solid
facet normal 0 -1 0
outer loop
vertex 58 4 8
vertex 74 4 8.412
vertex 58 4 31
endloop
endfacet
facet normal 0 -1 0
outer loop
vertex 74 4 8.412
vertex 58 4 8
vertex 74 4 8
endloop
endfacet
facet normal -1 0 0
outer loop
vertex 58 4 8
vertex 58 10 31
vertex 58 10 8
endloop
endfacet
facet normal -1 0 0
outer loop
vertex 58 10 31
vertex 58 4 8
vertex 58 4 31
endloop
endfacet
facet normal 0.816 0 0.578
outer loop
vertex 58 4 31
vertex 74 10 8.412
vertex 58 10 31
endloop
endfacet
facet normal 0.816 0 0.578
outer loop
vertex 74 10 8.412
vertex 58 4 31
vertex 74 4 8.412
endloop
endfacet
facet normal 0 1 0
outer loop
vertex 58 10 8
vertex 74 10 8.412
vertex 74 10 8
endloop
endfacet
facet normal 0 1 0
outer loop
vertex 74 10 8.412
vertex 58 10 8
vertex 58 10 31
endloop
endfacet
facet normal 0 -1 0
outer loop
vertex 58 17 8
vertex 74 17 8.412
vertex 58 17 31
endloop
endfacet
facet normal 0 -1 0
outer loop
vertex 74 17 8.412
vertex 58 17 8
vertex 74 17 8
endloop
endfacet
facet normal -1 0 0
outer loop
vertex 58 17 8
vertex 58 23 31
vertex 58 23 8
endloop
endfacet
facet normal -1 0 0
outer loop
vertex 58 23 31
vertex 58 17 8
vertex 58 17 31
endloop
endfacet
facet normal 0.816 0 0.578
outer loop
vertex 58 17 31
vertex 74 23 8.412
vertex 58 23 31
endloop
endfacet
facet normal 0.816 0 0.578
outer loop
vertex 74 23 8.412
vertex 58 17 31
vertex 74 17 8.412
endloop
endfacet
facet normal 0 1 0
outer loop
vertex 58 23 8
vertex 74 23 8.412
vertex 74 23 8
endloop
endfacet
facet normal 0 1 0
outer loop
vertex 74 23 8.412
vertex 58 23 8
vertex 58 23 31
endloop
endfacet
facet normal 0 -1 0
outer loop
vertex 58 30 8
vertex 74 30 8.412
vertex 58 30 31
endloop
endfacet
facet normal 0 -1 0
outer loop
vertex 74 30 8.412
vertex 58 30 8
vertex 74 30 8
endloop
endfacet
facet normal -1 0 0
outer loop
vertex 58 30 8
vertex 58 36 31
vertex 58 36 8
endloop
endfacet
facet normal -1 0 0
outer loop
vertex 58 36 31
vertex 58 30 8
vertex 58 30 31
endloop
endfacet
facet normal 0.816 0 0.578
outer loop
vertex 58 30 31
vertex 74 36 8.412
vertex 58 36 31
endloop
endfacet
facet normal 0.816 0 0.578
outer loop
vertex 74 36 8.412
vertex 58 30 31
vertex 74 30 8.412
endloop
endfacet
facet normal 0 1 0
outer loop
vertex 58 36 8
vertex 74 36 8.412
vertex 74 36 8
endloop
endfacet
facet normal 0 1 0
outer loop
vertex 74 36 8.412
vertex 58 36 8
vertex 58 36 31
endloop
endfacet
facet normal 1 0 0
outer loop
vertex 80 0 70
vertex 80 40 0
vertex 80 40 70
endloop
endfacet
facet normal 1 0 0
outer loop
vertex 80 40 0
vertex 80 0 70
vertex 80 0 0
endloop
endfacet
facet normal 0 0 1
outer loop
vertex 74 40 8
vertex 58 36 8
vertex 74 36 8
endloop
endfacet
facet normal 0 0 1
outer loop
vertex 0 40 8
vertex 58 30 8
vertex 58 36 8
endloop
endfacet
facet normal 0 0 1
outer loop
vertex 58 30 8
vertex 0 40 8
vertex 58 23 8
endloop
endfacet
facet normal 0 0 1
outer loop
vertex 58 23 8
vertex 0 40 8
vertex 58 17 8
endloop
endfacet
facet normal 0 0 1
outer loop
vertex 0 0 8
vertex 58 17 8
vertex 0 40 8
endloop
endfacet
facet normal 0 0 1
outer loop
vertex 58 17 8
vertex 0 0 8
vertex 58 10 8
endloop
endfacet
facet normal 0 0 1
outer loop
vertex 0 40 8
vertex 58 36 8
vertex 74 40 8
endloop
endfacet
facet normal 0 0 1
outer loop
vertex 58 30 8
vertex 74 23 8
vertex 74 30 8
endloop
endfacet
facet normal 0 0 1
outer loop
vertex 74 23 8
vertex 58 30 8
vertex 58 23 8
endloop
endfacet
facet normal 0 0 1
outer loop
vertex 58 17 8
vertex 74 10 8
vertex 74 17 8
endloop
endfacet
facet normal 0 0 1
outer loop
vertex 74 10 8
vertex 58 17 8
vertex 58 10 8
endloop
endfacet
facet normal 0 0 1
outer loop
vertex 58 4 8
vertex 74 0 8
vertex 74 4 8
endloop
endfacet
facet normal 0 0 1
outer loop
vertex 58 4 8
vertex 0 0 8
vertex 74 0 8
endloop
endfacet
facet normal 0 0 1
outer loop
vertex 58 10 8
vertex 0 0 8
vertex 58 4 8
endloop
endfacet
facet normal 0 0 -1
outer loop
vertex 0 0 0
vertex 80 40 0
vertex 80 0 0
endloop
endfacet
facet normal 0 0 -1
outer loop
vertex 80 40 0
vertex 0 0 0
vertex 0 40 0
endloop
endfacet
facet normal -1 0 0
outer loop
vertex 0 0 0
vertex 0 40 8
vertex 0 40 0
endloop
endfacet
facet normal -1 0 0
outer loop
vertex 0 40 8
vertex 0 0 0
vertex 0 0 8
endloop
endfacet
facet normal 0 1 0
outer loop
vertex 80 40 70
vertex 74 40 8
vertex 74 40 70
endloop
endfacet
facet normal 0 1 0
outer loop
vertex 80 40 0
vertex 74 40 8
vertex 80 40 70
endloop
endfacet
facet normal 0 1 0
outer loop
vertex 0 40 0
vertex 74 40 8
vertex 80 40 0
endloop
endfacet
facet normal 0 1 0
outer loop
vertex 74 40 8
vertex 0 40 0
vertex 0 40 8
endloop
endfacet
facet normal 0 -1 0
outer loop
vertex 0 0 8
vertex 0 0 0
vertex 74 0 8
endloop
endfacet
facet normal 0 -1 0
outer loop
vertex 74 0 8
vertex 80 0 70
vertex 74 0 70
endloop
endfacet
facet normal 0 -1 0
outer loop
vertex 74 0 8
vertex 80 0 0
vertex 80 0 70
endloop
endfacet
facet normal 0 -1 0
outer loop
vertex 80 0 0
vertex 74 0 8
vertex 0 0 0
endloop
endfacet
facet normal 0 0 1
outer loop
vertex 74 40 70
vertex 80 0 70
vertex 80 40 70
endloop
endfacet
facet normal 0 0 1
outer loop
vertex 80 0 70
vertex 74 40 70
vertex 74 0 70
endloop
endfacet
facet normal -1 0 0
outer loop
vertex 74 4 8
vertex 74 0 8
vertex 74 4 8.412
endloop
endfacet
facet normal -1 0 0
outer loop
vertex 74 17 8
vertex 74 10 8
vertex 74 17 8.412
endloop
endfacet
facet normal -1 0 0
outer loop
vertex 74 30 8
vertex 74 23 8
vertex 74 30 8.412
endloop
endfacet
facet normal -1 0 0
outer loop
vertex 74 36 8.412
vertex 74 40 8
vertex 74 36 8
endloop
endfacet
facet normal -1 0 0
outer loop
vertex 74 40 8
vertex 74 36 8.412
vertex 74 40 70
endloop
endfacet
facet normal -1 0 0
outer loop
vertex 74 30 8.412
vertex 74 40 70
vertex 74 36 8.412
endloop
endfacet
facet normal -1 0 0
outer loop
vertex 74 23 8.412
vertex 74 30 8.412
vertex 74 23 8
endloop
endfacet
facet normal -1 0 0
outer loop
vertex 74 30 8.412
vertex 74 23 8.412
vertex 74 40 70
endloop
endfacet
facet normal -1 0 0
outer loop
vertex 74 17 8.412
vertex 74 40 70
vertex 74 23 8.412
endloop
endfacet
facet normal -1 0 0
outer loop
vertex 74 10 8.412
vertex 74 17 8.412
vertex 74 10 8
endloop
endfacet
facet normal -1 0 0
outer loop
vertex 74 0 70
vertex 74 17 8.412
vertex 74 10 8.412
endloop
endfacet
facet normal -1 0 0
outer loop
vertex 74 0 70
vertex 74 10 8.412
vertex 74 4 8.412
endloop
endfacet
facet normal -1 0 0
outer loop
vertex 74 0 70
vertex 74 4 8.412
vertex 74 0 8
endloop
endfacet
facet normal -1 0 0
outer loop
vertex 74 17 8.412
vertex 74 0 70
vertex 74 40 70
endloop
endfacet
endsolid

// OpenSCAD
$fn = 32;

// ----------------------------------------------------------------------
// Rib bracket: 3-gusset L bracket
// ----------------------------------------------------------------------

// --- parameters (mm) ---
base_l = 80;              // foot length, X
base_w = 40;              // foot width, Y
base_t = 8;               // foot thickness
plate_t = 6;              // upright plate thickness
plate_h = 70;             // overall height
gus_l = 16;               // gusset leg along the foot
gus_h = 24;               // gusset height
gus_t = 6;                // gusset thickness
gus_edge = 4;             // gusset margin from the foot edge
n_gus = 3;                // gusset count
fit_tol = 0.1;            // tolerance for press fits, mm
free_tol = 0.3;           // tolerance for clearance fits, mm

gus_pitch = (base_w - 2 * gus_edge - gus_t) / (n_gus - 1);  // gusset pitch

union() {
  cube([base_l, base_w, base_t]);
  translate([base_l - plate_t, 0, base_t - 1])
    cube([plate_t, base_w, plate_h - base_t + 1]);
  for (i = [0 : n_gus - 1])
    translate([base_l - plate_t - gus_l, gus_edge + i * gus_pitch, base_t - 1])
      rotate([-90, 0, 0])
        linear_extrude(height = gus_t)
          polygon(points = [[0, 0], [gus_l + 1, 0], [0, -gus_h]]);
}
